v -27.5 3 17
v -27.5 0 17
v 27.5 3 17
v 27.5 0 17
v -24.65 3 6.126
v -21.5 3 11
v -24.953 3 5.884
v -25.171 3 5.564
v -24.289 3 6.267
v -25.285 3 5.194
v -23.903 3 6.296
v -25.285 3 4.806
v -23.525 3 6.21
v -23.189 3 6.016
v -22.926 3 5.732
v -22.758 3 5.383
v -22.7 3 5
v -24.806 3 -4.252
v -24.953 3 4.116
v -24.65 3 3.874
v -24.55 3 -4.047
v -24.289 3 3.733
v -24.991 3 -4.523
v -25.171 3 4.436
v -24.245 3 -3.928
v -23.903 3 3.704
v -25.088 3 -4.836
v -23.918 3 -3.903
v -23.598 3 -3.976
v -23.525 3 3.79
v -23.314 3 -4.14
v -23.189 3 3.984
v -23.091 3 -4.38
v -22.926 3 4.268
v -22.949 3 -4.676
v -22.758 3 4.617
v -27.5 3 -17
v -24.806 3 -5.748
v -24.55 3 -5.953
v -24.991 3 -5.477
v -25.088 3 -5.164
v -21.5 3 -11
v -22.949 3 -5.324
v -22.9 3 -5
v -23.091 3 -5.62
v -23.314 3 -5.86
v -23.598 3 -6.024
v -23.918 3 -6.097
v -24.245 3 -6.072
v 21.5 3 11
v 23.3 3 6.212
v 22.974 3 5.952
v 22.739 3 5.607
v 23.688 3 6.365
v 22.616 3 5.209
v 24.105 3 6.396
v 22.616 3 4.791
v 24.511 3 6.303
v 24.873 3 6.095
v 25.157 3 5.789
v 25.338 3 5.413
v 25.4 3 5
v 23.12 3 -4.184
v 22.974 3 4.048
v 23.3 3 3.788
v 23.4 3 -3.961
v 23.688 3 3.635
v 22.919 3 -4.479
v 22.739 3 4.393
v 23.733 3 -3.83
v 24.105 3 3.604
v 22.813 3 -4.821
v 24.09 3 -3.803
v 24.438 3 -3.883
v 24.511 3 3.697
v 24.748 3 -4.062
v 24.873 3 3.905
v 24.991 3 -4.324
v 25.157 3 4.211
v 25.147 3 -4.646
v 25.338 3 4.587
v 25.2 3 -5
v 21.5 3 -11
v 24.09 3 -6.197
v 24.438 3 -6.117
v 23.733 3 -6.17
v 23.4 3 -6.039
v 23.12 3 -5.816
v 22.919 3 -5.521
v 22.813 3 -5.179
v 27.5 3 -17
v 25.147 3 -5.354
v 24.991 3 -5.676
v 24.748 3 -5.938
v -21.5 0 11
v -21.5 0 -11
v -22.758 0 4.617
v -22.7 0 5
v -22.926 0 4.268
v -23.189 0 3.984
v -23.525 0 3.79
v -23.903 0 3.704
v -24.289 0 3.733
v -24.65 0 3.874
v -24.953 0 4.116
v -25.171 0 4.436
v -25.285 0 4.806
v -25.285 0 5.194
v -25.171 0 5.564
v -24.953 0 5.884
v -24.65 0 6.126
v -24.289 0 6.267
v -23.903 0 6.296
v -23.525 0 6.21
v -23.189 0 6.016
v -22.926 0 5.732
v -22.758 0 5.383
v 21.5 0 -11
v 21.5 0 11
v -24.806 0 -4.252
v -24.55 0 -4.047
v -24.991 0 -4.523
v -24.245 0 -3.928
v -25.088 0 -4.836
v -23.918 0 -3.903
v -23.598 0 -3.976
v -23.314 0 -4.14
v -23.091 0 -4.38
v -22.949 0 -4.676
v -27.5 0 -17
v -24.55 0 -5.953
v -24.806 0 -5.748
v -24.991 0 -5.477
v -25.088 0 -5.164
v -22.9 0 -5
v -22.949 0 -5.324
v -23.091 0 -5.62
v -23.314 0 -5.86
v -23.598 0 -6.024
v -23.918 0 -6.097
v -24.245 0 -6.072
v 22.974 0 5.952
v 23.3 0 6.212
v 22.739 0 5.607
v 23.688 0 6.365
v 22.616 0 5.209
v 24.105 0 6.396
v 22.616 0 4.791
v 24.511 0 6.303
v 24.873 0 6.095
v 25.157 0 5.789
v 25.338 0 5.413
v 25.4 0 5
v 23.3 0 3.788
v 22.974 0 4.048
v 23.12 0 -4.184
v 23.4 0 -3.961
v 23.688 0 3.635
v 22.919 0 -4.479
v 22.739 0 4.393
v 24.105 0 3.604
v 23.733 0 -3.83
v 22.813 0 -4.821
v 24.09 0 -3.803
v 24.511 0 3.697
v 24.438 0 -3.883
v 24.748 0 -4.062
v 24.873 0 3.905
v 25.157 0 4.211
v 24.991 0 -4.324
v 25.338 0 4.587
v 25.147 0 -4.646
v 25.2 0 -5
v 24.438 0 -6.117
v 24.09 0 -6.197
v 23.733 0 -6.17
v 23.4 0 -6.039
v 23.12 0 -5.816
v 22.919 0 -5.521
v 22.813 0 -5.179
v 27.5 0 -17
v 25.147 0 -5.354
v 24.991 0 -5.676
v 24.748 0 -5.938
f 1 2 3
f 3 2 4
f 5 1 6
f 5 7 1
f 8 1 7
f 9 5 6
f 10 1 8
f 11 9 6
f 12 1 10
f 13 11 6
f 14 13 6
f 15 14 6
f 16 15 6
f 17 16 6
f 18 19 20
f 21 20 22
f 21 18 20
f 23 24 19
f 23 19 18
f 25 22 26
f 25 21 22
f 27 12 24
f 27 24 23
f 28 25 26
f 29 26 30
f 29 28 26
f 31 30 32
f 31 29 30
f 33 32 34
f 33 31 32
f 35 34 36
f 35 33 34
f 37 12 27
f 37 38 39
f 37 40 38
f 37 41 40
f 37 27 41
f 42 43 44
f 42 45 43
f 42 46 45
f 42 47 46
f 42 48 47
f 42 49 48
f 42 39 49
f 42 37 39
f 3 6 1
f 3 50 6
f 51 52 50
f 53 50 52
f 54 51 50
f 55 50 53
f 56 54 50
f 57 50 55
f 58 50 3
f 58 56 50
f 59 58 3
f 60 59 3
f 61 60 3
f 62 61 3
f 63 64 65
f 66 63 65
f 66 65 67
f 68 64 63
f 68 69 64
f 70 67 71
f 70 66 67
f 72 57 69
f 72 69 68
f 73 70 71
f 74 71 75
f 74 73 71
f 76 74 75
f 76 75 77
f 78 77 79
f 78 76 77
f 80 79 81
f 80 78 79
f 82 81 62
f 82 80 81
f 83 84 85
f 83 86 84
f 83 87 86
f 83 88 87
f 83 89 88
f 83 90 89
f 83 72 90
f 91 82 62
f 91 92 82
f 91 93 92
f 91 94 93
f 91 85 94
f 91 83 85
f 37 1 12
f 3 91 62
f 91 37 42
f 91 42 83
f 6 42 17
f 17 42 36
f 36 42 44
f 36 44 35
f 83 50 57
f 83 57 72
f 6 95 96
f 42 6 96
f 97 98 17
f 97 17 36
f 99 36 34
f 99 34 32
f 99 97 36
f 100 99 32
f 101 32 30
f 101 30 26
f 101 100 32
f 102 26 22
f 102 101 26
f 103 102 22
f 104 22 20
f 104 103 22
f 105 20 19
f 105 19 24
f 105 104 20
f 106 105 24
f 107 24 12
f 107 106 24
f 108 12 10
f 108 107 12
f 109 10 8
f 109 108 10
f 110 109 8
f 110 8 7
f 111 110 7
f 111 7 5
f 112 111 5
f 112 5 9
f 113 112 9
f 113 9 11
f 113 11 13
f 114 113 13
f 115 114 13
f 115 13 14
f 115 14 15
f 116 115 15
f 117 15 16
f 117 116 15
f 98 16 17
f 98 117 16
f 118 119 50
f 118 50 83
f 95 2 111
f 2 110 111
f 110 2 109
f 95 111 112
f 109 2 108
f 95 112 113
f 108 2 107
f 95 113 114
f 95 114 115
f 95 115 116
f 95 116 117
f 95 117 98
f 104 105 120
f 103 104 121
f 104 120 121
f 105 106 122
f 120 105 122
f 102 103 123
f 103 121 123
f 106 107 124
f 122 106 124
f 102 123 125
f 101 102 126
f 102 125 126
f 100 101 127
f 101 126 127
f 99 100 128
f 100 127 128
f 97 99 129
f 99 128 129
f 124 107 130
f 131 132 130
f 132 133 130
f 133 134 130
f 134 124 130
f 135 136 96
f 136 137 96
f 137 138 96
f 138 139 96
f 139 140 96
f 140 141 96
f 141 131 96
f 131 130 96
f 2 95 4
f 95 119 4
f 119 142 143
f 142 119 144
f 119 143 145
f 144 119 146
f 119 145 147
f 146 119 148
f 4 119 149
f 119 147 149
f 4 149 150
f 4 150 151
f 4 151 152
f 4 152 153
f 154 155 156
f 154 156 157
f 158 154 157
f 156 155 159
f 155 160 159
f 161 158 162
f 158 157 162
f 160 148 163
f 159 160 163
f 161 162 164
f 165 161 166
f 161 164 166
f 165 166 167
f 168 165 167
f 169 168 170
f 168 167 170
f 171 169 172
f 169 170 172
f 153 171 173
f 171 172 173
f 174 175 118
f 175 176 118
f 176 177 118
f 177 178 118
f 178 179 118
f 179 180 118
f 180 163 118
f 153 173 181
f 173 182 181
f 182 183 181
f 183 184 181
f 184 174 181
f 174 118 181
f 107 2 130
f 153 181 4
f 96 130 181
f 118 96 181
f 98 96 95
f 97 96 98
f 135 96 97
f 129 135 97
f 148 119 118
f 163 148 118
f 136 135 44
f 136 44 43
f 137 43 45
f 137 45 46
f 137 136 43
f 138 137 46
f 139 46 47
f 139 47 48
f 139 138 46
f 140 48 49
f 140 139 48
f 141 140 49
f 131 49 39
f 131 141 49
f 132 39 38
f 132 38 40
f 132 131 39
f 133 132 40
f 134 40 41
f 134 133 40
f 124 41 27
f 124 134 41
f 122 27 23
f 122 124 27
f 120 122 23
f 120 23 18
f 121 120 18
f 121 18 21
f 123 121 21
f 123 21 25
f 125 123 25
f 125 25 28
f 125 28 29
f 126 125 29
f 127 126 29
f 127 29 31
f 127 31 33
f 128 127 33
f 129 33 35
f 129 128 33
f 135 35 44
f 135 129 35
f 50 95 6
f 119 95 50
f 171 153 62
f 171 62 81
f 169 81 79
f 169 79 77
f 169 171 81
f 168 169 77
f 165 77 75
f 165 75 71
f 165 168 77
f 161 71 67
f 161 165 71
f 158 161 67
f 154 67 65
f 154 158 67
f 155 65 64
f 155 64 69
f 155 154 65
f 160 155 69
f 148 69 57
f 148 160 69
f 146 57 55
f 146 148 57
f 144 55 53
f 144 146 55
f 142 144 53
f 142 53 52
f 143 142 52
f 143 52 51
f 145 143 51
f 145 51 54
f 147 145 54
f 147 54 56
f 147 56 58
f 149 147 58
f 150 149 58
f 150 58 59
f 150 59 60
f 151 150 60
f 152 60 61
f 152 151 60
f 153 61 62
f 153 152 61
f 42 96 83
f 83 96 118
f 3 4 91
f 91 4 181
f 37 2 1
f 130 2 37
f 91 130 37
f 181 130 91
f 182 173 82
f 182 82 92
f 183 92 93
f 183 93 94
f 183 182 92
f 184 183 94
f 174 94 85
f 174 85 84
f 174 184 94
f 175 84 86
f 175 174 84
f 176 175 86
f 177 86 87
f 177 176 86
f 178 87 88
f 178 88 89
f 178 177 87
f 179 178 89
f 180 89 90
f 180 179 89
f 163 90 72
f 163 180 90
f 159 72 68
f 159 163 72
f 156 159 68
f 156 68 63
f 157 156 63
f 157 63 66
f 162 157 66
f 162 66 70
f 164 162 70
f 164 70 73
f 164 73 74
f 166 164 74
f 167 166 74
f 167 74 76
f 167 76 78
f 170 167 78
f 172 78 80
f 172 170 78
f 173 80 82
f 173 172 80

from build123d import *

# Parameters (mm, degrees)
SKETCH1_W           = 55
SKETCH1_H           = 34
SKETCH1_R           = 1.1
SKETCH1_R_2         = 1.3
SKETCH1_R_3         = 1.2
SKETCH1_R_4         = 1.4
SKETCH1_W_2         = 43
SKETCH1_H_2         = 22
BOSS_EXTRUDE1_DEPTH = 3


with BuildPart() as part:
    # Sketch1 → Boss-Extrude1 (new body)
    with BuildSketch(Plane(origin=(0, 0, 0), x_dir=(1, 0, 0), z_dir=(0, 1, 0))):
        Rectangle(SKETCH1_W, SKETCH1_H)
        with Locations((-24, 5)):
            Circle(SKETCH1_R, mode=Mode.SUBTRACT)
        with Locations((-24, -5)):
            Circle(SKETCH1_R_2, mode=Mode.SUBTRACT)
        with Locations((24, 5)):
            Circle(SKETCH1_R_3, mode=Mode.SUBTRACT)
        with Locations((24, -5)):
            Circle(SKETCH1_R_4, mode=Mode.SUBTRACT)
        Rectangle(SKETCH1_W_2, SKETCH1_H_2, mode=Mode.SUBTRACT)
    extrude(amount=BOSS_EXTRUDE1_DEPTH)


solid = part.part
